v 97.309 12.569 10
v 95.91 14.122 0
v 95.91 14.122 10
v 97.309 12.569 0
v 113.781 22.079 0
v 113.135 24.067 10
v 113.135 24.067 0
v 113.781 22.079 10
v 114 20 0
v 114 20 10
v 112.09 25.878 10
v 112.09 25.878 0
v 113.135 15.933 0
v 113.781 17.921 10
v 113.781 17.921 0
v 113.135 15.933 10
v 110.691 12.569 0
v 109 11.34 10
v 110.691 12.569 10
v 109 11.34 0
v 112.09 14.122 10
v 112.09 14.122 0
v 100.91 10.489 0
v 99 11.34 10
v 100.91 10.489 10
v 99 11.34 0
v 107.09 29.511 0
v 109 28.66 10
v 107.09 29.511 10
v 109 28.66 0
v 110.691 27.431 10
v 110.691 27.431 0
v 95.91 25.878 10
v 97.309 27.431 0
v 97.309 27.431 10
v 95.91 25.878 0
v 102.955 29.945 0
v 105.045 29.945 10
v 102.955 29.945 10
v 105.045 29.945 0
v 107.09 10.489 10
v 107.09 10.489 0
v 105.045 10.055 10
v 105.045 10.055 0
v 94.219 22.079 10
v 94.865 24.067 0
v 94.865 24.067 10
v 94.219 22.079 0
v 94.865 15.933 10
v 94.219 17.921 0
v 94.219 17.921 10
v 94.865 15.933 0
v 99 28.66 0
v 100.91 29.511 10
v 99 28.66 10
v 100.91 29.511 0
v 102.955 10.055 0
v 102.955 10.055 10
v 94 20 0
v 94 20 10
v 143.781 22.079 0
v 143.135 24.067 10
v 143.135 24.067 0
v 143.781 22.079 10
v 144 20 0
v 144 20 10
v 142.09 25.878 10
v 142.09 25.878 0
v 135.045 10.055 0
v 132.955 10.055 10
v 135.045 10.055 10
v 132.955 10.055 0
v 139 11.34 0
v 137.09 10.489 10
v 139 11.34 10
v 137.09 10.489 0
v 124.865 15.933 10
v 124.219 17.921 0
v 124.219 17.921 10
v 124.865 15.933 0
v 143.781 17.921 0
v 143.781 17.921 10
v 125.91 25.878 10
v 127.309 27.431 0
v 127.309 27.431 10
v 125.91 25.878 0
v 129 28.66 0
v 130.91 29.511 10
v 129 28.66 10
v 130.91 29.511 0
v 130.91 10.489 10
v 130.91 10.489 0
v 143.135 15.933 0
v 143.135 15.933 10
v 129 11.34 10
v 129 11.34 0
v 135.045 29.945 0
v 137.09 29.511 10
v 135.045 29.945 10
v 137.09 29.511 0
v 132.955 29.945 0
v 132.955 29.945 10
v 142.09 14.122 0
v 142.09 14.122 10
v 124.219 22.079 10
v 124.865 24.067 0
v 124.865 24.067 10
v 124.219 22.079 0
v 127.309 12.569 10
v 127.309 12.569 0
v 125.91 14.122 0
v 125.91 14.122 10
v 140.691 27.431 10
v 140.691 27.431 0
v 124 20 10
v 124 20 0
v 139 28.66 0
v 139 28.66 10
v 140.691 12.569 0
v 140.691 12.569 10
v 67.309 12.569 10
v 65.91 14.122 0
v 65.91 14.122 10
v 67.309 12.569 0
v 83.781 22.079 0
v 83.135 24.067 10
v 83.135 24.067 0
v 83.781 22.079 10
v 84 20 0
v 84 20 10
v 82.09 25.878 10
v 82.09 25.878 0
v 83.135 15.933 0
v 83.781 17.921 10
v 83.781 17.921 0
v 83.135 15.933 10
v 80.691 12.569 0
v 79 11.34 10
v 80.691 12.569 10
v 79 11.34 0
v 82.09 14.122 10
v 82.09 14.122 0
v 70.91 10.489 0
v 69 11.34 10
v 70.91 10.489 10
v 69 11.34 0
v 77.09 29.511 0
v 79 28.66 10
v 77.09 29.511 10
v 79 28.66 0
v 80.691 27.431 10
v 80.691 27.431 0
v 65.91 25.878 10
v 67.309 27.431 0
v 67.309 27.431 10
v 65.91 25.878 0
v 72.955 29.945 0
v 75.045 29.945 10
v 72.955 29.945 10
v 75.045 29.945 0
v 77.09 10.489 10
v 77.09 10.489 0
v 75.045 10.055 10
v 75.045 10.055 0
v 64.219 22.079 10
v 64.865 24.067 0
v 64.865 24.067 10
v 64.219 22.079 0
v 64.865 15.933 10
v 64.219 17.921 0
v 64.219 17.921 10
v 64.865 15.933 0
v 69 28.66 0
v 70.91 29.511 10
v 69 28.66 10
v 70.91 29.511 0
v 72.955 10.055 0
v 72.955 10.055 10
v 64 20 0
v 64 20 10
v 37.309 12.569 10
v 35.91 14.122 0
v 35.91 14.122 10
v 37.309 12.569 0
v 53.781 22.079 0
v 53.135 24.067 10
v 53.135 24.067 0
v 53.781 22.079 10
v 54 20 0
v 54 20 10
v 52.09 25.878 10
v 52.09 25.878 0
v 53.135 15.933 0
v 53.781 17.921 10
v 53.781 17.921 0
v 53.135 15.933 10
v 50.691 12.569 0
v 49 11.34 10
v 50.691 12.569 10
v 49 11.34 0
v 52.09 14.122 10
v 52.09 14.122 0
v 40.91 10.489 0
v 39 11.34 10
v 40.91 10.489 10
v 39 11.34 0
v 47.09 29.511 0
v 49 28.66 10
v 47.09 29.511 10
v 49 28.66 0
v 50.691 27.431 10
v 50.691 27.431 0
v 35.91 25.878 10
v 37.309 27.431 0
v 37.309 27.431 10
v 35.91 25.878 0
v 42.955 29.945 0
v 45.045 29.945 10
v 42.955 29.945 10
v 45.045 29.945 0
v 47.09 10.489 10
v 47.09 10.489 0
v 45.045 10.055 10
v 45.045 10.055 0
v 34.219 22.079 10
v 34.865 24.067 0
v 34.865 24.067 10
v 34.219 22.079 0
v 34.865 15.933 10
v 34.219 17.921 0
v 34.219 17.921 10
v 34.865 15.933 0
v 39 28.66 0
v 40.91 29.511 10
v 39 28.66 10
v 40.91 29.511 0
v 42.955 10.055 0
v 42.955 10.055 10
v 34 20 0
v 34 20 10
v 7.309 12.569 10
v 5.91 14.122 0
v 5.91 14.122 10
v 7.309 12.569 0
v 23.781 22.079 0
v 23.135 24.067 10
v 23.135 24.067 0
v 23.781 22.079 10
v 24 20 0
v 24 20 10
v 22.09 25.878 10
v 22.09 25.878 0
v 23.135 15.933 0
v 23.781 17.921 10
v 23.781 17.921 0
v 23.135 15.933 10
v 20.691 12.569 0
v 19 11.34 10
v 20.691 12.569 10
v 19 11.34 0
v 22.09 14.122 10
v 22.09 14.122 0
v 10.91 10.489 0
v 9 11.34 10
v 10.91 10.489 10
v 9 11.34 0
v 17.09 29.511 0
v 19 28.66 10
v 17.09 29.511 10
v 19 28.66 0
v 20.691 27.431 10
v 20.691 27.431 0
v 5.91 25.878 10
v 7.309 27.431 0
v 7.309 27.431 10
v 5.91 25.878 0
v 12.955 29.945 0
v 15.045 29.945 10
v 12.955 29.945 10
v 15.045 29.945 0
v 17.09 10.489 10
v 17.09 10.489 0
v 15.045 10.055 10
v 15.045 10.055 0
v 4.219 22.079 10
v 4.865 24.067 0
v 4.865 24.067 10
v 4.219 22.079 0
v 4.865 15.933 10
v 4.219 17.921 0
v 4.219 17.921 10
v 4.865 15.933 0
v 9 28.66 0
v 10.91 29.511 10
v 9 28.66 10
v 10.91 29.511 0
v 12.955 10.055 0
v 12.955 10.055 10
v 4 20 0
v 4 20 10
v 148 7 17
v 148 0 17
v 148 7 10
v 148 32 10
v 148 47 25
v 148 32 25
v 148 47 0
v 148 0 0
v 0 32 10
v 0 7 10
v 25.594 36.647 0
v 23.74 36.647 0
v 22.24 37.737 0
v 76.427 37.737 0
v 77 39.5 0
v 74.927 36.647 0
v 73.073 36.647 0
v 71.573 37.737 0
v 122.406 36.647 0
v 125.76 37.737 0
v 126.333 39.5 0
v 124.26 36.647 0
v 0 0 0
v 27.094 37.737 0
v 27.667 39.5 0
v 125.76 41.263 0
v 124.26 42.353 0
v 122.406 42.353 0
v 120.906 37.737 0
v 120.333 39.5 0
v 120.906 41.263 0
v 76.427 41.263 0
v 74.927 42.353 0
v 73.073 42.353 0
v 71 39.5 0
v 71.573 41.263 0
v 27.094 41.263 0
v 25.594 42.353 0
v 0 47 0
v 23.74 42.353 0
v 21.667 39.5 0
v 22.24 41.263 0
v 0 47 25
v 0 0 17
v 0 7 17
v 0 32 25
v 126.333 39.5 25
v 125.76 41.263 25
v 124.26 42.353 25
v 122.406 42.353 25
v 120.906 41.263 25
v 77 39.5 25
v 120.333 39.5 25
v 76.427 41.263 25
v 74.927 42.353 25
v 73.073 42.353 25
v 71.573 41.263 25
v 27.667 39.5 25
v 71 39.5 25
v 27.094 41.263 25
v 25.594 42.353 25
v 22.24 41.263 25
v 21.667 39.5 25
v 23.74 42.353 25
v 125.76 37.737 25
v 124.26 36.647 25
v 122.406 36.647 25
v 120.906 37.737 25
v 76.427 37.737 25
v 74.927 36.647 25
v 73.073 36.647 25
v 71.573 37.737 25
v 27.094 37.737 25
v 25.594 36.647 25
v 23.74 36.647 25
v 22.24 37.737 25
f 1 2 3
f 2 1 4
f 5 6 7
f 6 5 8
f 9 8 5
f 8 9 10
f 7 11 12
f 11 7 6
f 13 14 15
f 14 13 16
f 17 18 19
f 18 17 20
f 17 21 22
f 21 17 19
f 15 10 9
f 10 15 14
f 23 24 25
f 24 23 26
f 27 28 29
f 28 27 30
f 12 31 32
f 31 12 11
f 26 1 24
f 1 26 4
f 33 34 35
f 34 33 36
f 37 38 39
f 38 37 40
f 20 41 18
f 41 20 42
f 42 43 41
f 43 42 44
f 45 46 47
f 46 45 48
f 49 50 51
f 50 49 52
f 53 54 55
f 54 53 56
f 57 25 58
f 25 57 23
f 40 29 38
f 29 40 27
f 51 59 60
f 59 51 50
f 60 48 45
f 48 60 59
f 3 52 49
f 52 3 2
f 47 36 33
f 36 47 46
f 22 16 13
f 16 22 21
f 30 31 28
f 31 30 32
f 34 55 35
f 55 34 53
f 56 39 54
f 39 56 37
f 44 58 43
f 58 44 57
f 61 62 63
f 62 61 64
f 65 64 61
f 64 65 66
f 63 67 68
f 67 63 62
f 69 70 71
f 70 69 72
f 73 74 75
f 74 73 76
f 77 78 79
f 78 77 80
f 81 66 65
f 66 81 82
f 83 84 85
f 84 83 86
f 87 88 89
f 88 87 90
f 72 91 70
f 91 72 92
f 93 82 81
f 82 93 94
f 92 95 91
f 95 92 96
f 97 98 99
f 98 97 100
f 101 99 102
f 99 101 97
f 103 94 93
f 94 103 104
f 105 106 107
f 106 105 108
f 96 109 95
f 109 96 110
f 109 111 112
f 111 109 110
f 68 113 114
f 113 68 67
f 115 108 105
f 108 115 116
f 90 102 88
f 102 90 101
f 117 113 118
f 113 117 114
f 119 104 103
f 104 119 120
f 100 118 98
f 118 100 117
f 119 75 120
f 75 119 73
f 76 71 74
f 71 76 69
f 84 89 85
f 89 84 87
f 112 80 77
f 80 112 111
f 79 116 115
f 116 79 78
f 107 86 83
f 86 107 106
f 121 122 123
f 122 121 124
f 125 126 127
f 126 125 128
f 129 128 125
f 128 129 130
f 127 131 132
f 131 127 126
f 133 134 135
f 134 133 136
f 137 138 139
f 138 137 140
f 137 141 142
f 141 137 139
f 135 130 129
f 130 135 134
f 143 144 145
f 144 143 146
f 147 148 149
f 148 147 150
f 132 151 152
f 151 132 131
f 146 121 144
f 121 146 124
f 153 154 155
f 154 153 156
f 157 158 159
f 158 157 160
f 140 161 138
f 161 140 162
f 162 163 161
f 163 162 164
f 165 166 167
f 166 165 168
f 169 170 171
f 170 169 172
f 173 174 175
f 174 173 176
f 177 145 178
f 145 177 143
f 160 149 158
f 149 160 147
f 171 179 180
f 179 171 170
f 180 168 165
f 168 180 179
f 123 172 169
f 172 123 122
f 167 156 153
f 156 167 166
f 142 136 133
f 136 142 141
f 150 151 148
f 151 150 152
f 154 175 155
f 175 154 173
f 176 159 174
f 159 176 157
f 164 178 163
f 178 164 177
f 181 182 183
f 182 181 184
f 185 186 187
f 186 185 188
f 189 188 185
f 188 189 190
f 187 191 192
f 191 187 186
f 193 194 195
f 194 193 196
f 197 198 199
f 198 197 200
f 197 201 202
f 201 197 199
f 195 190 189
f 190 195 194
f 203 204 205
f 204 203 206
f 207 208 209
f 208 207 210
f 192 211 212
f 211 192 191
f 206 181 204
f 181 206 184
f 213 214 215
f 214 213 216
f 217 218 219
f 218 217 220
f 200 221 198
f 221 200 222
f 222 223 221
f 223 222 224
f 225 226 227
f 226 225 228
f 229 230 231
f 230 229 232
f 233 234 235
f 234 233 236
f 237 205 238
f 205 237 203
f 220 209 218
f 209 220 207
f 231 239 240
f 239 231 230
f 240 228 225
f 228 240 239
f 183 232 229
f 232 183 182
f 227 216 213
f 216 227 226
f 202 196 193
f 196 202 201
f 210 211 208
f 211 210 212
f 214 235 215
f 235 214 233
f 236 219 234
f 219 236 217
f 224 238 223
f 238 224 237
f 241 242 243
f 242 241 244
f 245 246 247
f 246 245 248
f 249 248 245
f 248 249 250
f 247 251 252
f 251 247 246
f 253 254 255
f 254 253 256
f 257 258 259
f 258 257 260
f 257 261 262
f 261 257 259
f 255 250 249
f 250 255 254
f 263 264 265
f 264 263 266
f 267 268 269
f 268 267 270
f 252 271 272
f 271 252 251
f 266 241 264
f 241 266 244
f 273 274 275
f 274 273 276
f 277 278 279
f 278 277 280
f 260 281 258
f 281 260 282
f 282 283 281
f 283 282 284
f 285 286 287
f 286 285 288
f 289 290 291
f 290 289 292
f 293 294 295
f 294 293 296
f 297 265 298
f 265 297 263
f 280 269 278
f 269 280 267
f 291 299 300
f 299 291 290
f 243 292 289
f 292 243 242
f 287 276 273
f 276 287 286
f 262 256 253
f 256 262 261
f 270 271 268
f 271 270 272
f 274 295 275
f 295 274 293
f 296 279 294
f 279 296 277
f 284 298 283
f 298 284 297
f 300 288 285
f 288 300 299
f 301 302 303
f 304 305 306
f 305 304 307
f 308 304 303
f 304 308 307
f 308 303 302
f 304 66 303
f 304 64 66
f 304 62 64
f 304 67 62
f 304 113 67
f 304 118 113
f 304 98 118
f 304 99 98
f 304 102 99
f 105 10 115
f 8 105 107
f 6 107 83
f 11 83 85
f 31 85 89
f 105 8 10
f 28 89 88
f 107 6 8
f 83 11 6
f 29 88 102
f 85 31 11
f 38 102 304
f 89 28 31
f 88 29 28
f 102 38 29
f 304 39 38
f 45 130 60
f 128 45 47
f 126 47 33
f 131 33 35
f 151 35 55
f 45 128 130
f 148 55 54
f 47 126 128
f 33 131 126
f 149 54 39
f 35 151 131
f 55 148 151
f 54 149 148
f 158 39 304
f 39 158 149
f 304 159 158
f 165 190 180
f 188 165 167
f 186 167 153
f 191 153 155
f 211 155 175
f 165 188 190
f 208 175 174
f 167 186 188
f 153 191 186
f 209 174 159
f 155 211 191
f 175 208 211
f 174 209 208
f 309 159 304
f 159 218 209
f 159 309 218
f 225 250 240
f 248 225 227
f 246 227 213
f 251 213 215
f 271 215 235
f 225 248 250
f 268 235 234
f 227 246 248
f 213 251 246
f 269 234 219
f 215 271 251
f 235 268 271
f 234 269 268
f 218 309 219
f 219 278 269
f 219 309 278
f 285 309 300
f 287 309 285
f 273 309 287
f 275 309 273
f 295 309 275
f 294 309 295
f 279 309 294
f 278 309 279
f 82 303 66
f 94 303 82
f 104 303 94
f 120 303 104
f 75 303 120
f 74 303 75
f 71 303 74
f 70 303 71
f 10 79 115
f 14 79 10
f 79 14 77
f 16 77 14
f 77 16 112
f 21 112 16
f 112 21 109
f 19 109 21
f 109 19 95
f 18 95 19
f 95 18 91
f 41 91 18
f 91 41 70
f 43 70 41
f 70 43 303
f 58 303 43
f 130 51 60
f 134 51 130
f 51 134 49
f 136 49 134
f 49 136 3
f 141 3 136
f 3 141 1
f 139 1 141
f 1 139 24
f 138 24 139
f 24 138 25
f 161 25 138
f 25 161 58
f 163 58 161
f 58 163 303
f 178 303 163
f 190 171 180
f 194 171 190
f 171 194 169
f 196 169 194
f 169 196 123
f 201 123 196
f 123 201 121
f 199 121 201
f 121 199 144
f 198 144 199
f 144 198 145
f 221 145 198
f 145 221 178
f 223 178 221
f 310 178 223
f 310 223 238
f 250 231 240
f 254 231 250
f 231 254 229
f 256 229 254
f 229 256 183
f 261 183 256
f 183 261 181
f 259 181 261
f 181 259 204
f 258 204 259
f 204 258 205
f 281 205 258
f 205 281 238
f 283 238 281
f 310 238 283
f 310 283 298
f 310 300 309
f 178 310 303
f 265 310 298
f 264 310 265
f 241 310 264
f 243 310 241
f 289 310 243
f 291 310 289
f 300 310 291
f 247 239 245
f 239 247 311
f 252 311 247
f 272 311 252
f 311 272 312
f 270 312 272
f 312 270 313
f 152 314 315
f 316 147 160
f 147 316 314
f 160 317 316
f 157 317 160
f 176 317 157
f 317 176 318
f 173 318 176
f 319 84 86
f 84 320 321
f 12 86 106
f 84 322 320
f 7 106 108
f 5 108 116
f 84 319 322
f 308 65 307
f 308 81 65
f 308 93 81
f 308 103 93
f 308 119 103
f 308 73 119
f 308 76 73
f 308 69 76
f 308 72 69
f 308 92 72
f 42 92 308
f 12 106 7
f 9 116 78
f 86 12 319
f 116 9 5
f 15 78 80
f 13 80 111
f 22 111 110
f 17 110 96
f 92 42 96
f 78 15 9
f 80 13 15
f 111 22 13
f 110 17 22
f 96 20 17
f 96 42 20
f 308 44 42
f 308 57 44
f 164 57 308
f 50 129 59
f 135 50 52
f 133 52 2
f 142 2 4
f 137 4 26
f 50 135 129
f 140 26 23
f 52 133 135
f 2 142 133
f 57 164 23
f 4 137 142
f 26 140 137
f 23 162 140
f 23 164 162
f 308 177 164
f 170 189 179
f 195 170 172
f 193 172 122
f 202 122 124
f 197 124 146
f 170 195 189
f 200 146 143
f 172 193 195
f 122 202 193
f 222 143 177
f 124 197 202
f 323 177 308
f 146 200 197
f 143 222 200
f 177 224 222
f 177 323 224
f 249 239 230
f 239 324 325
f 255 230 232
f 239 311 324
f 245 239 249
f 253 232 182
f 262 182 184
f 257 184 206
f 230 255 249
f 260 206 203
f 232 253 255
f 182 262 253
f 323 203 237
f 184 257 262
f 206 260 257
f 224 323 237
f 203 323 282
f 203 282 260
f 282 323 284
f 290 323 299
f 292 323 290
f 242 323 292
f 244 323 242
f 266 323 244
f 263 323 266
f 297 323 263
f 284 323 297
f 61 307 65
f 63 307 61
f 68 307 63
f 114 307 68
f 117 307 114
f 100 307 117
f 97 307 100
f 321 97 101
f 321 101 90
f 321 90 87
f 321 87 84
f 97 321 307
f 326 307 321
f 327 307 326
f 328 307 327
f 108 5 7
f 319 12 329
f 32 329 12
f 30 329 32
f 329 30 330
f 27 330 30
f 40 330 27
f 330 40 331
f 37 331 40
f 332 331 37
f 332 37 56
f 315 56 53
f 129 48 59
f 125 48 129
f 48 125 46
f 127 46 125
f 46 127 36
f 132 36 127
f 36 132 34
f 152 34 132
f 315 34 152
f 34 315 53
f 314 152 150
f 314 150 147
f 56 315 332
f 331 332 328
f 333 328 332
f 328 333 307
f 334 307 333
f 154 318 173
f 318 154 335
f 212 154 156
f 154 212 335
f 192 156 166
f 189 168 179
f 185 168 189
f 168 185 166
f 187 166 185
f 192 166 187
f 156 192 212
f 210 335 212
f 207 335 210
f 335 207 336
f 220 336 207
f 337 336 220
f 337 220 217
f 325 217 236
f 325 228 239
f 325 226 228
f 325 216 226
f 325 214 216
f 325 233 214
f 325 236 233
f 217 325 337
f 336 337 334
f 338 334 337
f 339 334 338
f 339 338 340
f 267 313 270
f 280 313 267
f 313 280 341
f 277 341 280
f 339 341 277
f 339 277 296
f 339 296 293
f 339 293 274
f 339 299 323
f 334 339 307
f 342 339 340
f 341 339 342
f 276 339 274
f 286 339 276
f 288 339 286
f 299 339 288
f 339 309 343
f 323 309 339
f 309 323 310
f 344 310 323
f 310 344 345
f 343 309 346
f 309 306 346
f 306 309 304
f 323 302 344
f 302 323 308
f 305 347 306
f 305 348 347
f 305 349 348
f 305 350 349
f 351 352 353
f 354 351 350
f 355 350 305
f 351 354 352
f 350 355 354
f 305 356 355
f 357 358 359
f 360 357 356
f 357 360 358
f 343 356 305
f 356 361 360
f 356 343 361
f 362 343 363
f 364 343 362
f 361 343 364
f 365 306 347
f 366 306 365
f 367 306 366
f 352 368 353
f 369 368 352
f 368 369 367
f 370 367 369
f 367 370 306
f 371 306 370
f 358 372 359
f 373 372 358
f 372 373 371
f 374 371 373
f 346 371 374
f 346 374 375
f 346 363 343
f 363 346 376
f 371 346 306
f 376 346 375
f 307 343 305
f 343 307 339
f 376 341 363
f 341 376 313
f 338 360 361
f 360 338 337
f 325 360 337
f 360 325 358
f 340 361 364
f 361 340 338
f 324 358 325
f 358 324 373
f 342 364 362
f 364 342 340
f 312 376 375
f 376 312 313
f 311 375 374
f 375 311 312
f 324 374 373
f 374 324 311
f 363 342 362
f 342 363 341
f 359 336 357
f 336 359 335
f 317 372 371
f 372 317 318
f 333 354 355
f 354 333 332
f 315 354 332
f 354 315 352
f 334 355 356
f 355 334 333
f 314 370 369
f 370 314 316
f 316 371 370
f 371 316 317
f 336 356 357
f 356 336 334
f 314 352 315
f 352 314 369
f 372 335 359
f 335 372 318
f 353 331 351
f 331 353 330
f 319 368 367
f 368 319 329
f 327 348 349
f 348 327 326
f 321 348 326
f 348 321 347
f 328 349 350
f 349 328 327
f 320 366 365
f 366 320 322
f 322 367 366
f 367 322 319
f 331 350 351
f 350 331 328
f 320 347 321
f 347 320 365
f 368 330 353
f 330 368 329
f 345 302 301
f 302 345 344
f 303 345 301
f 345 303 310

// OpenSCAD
difference(){

    cube([148, 32, 10], center = false);
    translate([14, 20, -5]){
        cylinder(20, 10, 10, false);
        translate([30, 0, 0]){
            cylinder(20, 10, 10, false);
            translate([30, 0, 0]){
                cylinder(20, 10, 10, false);
                translate([30, 0, 0]){
                    cylinder(20, 10, 10, false);
                    translate([30, 0, 0]){
                        cylinder(20, 10, 10, false);
                        }
                    }
                }
            }
        }
    }

difference(){
    translate([0, 32, 0]){
        cube([148, 15, 25], center = false);
    }
    translate([148/6, 39.5, -5]){
        cylinder(50, 3, 3, false);
    }
    translate([148/2, 39.5, -5]){
        cylinder(50, 3, 3, false);
    }
    translate([5*(148/6), 39.5, -5]){
        cylinder(50, 3, 3, false);
    }
}
translate([0, 0, 10]){
    cube([148, 7, 7], center = false);
}
